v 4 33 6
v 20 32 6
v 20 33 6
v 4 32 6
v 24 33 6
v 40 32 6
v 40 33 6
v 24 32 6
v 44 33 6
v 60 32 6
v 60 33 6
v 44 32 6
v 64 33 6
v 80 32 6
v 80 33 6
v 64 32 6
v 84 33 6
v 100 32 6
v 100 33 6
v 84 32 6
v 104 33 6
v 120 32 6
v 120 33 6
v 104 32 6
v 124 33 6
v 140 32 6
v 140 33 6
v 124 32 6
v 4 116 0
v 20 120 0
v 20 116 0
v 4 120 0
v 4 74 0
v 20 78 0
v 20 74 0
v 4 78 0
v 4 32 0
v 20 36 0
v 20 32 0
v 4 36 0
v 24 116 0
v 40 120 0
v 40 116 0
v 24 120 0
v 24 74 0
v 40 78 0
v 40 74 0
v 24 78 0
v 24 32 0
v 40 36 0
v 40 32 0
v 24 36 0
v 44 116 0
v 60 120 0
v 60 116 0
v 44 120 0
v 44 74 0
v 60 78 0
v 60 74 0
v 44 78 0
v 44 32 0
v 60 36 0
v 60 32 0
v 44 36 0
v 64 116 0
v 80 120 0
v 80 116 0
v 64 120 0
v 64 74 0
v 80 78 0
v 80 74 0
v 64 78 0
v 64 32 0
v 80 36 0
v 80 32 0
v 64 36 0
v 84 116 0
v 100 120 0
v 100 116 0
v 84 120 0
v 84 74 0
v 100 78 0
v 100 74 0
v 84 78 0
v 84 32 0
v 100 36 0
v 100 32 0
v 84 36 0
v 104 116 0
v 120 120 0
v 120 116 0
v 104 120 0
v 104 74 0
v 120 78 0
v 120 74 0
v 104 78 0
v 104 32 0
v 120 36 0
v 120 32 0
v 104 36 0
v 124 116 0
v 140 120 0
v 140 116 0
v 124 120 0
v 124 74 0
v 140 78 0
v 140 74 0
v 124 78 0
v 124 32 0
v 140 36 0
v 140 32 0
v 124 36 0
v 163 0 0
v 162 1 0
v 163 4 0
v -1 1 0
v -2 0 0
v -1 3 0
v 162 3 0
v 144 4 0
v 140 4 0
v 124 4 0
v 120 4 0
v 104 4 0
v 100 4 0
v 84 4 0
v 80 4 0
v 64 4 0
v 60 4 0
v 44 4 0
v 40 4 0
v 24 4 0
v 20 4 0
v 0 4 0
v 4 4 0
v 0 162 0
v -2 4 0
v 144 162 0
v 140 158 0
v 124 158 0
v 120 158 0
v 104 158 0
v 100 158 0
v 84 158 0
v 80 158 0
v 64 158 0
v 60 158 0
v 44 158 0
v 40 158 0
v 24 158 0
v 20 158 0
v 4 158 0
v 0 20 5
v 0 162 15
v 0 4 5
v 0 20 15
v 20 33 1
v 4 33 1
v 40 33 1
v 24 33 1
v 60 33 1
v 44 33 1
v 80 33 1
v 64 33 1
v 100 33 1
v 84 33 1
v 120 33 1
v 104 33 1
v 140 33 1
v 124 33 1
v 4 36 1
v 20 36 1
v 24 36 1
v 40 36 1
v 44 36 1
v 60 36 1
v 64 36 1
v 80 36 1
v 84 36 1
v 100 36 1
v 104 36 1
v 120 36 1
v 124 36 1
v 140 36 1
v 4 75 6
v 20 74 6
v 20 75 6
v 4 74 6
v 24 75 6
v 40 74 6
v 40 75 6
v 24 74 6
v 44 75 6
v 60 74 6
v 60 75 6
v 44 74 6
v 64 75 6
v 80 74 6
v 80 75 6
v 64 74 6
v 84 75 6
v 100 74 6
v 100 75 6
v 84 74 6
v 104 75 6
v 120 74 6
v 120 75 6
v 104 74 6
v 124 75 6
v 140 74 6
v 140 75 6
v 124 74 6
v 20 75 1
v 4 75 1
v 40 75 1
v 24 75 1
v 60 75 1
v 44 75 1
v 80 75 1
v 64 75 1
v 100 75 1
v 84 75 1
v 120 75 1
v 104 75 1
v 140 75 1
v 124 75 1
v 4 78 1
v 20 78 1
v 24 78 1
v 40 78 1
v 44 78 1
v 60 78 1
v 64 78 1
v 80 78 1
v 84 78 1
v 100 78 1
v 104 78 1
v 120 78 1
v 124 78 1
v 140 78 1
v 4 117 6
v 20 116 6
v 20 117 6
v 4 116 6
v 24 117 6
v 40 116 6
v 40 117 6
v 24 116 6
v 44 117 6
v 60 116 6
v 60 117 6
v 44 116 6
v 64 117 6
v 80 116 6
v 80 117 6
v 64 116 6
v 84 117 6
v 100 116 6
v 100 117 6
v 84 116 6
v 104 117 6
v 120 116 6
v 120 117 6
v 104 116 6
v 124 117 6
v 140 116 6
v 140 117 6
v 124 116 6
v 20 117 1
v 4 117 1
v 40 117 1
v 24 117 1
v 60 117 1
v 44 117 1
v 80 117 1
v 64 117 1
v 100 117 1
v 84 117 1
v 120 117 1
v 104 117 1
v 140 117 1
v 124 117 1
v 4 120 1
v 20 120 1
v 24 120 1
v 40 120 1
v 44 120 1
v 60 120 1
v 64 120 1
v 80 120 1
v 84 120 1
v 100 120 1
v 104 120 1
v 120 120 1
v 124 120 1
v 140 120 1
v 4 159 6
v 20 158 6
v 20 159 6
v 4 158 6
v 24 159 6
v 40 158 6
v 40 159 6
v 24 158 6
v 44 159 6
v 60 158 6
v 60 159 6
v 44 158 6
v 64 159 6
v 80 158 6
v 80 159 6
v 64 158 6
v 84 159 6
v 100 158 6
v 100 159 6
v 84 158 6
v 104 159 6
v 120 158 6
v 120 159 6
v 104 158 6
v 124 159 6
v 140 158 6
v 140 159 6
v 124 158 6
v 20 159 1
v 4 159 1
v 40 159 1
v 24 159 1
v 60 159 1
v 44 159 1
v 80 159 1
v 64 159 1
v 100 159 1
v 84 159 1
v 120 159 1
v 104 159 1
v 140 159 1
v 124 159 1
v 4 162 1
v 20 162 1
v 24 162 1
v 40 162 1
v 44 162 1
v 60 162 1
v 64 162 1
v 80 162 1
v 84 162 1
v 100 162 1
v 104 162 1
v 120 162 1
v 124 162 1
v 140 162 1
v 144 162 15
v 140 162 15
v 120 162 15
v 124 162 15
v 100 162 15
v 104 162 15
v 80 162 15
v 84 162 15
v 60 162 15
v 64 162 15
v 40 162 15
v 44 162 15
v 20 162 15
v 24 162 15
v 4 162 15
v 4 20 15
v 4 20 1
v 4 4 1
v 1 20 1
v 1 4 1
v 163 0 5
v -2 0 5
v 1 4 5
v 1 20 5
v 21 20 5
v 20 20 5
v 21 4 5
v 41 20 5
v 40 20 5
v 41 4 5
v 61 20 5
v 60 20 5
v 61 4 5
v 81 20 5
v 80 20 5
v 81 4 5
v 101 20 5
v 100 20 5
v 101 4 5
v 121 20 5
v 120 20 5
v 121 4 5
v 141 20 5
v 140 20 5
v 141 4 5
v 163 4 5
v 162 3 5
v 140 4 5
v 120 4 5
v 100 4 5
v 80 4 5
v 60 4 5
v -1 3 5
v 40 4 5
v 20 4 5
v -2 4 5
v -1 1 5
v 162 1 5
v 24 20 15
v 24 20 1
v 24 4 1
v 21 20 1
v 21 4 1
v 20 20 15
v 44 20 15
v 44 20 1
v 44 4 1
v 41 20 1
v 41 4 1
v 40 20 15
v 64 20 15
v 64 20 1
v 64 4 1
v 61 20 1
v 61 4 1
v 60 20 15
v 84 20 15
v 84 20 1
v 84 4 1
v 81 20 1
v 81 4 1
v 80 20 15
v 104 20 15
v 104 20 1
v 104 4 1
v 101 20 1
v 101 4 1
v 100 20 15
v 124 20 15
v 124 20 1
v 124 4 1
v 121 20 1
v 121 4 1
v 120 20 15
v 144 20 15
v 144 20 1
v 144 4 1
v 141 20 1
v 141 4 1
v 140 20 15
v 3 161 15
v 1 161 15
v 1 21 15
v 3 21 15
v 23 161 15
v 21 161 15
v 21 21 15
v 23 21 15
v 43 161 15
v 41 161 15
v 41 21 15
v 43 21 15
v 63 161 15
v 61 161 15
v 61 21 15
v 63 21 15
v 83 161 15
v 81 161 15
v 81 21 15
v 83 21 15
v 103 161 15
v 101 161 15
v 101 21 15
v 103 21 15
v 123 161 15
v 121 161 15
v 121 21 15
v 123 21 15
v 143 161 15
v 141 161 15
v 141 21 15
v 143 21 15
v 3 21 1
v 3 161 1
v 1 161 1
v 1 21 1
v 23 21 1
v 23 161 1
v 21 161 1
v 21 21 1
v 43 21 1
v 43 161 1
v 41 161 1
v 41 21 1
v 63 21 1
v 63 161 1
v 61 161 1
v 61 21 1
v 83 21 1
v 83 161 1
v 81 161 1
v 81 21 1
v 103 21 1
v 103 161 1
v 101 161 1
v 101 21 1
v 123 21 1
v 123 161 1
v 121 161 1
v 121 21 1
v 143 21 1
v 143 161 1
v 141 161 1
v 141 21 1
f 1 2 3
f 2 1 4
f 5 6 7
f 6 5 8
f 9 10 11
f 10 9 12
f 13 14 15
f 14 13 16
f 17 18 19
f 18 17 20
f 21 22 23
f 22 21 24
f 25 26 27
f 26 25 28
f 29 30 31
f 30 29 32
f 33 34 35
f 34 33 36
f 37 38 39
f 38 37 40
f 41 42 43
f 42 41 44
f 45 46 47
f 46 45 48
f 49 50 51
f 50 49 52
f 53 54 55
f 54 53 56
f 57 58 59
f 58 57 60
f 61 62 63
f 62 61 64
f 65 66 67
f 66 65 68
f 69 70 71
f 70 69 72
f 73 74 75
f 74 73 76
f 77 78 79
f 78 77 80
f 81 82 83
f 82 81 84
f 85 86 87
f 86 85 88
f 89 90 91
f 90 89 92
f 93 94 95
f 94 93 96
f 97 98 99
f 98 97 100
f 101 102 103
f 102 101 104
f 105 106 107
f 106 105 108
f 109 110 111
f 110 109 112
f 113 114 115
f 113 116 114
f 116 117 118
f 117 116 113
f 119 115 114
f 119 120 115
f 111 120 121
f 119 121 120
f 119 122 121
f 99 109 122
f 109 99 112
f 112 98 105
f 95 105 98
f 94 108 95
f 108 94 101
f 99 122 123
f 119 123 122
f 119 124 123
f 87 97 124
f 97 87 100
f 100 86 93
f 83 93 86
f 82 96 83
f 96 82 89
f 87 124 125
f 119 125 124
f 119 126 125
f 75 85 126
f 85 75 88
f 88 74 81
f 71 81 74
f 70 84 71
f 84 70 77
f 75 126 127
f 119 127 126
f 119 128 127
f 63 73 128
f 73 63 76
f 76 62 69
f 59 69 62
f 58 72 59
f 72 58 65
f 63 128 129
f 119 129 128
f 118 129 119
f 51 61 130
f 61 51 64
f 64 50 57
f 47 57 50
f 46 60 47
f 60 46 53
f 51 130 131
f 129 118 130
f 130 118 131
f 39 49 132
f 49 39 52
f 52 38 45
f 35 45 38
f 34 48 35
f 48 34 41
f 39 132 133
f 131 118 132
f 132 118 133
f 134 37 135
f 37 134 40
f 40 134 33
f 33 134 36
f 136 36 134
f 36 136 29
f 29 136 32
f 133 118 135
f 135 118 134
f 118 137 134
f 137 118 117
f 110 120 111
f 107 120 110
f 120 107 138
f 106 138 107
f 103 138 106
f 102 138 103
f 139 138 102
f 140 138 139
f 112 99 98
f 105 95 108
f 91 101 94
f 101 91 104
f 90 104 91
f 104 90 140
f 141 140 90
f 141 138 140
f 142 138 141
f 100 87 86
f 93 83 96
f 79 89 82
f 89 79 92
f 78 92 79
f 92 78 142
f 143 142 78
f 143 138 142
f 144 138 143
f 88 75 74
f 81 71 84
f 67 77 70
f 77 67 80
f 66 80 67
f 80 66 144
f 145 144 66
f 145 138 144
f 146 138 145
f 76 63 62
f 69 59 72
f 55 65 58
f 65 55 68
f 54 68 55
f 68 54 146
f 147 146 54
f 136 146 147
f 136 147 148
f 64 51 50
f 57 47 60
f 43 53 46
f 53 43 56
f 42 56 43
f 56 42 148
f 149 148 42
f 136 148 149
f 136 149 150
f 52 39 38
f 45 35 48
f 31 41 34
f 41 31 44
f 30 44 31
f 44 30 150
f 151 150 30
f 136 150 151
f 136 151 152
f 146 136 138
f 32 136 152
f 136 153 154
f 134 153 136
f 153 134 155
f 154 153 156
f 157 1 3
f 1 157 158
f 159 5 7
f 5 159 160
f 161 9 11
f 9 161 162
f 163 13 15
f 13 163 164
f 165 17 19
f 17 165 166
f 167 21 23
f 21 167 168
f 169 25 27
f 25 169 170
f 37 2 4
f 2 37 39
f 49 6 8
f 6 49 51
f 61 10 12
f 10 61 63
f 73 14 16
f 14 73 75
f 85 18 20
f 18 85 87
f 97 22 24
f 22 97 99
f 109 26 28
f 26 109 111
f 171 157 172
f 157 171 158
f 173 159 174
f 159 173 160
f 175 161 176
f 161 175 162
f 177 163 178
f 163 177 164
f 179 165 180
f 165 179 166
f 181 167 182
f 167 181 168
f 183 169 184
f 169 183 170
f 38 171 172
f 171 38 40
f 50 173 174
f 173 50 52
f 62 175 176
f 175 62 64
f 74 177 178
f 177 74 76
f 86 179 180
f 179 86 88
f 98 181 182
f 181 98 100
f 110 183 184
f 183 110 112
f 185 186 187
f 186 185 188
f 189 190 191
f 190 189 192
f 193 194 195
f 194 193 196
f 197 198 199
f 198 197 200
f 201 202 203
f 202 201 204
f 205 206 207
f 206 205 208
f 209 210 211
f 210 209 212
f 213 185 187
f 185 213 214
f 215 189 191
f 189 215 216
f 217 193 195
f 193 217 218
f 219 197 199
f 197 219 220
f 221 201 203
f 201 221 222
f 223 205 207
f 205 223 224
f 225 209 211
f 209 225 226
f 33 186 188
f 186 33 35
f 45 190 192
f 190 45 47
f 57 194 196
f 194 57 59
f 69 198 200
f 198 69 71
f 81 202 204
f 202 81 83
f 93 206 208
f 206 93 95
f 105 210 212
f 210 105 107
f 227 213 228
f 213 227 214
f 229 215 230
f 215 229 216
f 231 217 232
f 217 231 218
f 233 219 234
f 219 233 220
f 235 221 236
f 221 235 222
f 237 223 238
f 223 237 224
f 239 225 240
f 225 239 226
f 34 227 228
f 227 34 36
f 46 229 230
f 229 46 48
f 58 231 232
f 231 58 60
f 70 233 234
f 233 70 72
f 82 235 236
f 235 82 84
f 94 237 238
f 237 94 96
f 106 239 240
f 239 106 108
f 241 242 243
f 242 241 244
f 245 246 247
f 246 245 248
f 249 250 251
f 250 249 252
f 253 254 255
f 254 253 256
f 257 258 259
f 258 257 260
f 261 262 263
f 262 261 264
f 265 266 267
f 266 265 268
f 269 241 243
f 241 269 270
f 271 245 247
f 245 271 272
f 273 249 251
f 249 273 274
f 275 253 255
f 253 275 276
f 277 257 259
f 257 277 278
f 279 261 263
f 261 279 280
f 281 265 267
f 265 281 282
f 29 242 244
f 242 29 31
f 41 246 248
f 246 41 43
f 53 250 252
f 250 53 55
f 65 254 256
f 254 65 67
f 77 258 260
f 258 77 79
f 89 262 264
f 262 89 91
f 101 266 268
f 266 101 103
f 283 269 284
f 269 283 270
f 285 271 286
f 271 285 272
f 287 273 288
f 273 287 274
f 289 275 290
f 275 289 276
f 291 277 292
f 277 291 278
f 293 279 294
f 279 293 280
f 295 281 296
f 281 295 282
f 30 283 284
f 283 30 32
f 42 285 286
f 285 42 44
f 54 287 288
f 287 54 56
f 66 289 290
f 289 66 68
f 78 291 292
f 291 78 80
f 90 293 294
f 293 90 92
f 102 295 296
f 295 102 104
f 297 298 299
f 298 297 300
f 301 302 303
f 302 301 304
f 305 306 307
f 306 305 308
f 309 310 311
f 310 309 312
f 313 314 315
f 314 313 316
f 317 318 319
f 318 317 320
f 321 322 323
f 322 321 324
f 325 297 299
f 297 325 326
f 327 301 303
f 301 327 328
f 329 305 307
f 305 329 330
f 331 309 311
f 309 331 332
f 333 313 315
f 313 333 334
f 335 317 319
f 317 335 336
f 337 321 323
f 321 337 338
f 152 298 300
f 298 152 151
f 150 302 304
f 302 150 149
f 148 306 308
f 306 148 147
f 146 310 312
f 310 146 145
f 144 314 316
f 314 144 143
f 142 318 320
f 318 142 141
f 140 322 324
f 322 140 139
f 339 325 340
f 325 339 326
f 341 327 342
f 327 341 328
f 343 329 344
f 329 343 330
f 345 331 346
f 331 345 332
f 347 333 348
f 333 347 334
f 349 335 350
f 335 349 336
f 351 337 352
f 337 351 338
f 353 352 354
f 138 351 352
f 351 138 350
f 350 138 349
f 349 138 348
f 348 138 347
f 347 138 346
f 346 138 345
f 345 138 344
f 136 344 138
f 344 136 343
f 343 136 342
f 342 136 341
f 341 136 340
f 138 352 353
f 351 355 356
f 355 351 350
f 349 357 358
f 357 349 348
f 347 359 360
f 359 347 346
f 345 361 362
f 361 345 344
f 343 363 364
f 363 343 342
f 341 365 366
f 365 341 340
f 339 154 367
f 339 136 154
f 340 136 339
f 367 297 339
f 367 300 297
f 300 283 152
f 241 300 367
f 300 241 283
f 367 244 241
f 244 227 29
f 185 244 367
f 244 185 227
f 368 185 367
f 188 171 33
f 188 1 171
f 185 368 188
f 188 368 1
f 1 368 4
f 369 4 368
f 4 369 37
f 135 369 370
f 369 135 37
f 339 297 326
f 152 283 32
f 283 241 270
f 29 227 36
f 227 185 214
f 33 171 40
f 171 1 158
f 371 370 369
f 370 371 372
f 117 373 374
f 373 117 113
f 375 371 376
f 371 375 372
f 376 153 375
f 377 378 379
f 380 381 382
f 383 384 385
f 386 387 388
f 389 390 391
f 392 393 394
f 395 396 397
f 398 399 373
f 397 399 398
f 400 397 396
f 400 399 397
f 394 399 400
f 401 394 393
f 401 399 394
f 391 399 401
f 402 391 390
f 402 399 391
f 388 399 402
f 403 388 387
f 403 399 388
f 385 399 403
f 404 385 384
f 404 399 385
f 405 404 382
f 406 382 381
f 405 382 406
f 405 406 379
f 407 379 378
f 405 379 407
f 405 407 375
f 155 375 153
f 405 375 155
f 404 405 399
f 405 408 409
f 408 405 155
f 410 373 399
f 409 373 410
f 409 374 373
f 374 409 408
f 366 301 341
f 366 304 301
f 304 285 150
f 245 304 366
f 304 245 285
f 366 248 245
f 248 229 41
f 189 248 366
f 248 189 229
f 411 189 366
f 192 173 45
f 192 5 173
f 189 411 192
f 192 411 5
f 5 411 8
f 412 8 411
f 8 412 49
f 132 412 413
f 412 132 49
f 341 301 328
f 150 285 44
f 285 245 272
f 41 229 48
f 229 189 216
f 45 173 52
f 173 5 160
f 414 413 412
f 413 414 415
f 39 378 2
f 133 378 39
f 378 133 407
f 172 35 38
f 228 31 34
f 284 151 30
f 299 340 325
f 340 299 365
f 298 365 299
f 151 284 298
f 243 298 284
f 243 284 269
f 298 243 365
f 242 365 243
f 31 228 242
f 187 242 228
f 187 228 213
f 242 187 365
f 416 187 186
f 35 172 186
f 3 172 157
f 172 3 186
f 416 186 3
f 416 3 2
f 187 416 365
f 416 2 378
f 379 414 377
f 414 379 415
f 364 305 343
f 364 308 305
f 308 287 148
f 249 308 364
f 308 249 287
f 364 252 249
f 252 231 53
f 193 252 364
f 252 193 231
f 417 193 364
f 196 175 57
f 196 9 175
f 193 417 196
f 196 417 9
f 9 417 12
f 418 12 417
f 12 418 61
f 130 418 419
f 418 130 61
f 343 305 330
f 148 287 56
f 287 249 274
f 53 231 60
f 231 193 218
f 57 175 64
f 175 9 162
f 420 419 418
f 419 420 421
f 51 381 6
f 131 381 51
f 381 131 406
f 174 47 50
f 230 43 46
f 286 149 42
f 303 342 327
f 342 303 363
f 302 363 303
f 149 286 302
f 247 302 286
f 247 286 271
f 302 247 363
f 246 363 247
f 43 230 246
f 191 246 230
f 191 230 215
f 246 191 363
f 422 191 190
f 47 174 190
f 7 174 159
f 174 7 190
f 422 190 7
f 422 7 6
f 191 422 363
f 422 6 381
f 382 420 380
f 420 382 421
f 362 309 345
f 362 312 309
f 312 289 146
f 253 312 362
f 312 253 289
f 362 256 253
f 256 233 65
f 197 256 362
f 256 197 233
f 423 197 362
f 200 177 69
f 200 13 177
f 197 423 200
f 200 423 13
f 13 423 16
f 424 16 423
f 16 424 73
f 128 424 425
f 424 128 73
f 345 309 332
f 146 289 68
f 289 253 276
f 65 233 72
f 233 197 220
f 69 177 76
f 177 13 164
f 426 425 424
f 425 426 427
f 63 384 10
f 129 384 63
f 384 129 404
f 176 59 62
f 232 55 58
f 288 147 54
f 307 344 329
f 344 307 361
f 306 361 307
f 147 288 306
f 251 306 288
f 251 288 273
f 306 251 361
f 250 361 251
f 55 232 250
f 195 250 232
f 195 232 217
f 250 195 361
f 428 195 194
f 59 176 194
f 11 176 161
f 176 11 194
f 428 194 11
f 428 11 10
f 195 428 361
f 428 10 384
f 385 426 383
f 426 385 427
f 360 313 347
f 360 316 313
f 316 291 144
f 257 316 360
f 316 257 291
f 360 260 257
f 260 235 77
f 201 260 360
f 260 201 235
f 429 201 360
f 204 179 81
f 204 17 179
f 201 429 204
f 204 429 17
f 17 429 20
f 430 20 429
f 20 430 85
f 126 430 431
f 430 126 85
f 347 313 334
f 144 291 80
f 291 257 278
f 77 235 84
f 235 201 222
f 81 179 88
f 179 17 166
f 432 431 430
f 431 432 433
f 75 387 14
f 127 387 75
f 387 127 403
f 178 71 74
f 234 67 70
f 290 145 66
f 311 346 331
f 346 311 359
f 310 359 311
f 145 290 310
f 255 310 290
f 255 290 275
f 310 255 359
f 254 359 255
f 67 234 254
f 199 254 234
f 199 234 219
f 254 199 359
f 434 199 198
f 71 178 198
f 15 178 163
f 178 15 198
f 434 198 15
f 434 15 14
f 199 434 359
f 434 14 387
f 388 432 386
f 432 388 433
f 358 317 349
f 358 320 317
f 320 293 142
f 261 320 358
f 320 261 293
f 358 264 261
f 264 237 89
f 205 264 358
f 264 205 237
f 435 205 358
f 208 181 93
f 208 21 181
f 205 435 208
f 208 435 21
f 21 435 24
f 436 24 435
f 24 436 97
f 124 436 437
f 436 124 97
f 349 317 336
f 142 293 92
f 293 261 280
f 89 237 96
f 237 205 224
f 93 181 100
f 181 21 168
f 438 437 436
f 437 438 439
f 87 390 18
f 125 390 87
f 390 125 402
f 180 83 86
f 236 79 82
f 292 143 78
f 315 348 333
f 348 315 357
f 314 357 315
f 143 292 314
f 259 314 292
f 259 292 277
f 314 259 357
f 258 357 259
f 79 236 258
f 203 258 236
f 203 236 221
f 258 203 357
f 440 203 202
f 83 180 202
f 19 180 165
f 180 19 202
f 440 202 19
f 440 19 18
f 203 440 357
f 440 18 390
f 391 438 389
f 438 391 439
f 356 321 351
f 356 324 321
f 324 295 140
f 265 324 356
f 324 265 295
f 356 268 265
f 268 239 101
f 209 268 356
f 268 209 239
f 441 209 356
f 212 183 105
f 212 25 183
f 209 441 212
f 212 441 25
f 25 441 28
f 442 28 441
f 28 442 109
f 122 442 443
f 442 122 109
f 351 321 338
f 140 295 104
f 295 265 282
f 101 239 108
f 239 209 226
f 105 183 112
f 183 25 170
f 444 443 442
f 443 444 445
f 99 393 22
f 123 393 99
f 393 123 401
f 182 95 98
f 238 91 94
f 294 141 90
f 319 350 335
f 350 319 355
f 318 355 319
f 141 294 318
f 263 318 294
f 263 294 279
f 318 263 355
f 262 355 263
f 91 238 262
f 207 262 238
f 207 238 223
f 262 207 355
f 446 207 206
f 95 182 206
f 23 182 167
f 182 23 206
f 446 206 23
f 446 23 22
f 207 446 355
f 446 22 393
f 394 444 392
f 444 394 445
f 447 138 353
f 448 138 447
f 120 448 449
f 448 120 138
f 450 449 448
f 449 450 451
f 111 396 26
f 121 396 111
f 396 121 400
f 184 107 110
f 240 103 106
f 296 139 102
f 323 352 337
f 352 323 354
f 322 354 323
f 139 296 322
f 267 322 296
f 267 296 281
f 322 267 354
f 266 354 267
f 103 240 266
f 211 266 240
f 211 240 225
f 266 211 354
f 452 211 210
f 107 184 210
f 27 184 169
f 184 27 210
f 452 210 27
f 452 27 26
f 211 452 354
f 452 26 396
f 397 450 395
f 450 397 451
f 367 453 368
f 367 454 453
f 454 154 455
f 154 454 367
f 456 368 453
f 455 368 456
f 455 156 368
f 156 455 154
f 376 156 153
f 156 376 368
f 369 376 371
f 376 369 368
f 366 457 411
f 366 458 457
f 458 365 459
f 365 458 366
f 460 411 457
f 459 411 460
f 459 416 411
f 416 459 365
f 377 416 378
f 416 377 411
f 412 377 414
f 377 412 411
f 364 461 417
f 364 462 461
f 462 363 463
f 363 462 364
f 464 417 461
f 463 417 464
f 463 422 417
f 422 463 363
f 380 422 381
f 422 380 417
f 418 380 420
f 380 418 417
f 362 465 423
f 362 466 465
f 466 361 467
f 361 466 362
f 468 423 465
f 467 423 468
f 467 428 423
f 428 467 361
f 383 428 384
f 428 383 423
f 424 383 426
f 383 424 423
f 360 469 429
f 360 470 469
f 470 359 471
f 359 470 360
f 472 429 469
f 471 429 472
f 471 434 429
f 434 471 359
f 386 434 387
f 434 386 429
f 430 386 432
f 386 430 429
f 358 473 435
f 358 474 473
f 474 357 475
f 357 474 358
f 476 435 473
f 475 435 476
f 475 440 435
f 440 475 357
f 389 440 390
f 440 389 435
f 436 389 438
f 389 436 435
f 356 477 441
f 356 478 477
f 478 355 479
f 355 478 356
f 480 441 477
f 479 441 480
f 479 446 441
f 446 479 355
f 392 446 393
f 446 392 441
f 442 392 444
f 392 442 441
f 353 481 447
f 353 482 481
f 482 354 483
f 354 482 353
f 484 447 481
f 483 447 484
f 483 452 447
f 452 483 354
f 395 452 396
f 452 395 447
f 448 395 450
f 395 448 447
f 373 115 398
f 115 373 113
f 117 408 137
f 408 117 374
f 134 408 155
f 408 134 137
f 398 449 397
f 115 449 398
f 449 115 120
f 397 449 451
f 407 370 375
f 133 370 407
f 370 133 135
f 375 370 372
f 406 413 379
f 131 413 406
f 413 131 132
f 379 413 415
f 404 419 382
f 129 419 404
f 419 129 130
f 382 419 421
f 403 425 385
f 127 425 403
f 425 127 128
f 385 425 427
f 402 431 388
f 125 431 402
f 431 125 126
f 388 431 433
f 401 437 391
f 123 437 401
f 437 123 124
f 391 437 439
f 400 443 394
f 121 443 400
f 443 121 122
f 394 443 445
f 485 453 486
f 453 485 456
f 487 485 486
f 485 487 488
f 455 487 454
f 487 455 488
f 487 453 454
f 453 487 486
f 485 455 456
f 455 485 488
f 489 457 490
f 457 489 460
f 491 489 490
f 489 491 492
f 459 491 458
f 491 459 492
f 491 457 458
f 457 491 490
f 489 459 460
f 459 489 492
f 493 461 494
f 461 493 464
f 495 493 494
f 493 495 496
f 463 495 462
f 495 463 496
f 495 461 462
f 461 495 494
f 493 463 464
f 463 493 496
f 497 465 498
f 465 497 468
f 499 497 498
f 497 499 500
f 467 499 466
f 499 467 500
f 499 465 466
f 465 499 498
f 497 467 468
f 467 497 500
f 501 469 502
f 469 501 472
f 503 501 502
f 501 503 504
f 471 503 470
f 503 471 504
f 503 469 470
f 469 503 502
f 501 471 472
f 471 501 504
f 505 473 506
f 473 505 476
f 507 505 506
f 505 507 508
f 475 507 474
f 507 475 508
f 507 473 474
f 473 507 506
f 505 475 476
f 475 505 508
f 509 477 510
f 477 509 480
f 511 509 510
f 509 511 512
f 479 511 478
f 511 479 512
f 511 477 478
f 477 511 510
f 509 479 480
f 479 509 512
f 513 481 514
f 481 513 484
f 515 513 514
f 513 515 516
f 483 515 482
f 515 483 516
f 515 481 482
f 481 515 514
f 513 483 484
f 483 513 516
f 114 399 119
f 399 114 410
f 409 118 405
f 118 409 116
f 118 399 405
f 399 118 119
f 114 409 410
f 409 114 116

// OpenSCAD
mm = 1;

epsilon = 0.1 * mm;

slot_offset = 20 * mm;
slot_length = 140 * mm;
slot_depth = 15 * mm;
slot_width = 2 * mm;

front_slot_depth = 5 * mm;
front_slot_width = 2 * mm;
front_slot_margin = 2 * mm;

card_spacing = 20 * mm;
num_cards = 8;

support_width = 4 * mm;
support_height = 6 * mm;

wall_width = 1 * mm;

module shell()
{
    translate([ -front_slot_margin, 0, 0 ]) cube([
        card_spacing * num_cards + wall_width + 2 * front_slot_margin,
        front_slot_width + 2 * wall_width,
        front_slot_depth,
    ]);

    for (i = [ 0.1, 0.4, 0.7, 1 ])
    {
        translate([ 0, slot_offset + slot_length * i + 2 * wall_width - support_width, 0 ])
        {
            cube([
                card_spacing * (num_cards - 1) + epsilon,
                wall_width,
                support_height,
            ]);
            cube([
                card_spacing * (num_cards - 1) + epsilon,
                support_width,
                wall_width,
            ]);
        }
    }
    for (i = [0:num_cards - 1])
    {
        translate([ card_spacing * i, slot_offset, 0 ]) cube([
            slot_width + 2 * wall_width,
            slot_length + 2 * wall_width,
            slot_depth,
        ]);
        translate([ card_spacing * i, 0, 0 ])
        {
            cube([ slot_width + 2 * wall_width, slot_length + 2 * wall_width + slot_offset, wall_width ]);
            cube([ wall_width, slot_length + 2 * wall_width + slot_offset, min(front_slot_depth, support_height) ]);
        }
    }
}

module pci_rack()
{
    difference()
    {
        shell();
        for (i = [0:num_cards - 1])
        {
            translate([ card_spacing * i + wall_width, slot_offset + wall_width, wall_width ]) cube([
                slot_width,
                slot_length,
                slot_depth + 2 * epsilon,
            ]);
        }
        translate([ wall_width - front_slot_margin, wall_width, -epsilon ]) cube([
            card_spacing * num_cards - wall_width + 2 * front_slot_margin,
            front_slot_width,
            front_slot_depth + 2 * epsilon,
        ]);
    }
}

pci_rack();
